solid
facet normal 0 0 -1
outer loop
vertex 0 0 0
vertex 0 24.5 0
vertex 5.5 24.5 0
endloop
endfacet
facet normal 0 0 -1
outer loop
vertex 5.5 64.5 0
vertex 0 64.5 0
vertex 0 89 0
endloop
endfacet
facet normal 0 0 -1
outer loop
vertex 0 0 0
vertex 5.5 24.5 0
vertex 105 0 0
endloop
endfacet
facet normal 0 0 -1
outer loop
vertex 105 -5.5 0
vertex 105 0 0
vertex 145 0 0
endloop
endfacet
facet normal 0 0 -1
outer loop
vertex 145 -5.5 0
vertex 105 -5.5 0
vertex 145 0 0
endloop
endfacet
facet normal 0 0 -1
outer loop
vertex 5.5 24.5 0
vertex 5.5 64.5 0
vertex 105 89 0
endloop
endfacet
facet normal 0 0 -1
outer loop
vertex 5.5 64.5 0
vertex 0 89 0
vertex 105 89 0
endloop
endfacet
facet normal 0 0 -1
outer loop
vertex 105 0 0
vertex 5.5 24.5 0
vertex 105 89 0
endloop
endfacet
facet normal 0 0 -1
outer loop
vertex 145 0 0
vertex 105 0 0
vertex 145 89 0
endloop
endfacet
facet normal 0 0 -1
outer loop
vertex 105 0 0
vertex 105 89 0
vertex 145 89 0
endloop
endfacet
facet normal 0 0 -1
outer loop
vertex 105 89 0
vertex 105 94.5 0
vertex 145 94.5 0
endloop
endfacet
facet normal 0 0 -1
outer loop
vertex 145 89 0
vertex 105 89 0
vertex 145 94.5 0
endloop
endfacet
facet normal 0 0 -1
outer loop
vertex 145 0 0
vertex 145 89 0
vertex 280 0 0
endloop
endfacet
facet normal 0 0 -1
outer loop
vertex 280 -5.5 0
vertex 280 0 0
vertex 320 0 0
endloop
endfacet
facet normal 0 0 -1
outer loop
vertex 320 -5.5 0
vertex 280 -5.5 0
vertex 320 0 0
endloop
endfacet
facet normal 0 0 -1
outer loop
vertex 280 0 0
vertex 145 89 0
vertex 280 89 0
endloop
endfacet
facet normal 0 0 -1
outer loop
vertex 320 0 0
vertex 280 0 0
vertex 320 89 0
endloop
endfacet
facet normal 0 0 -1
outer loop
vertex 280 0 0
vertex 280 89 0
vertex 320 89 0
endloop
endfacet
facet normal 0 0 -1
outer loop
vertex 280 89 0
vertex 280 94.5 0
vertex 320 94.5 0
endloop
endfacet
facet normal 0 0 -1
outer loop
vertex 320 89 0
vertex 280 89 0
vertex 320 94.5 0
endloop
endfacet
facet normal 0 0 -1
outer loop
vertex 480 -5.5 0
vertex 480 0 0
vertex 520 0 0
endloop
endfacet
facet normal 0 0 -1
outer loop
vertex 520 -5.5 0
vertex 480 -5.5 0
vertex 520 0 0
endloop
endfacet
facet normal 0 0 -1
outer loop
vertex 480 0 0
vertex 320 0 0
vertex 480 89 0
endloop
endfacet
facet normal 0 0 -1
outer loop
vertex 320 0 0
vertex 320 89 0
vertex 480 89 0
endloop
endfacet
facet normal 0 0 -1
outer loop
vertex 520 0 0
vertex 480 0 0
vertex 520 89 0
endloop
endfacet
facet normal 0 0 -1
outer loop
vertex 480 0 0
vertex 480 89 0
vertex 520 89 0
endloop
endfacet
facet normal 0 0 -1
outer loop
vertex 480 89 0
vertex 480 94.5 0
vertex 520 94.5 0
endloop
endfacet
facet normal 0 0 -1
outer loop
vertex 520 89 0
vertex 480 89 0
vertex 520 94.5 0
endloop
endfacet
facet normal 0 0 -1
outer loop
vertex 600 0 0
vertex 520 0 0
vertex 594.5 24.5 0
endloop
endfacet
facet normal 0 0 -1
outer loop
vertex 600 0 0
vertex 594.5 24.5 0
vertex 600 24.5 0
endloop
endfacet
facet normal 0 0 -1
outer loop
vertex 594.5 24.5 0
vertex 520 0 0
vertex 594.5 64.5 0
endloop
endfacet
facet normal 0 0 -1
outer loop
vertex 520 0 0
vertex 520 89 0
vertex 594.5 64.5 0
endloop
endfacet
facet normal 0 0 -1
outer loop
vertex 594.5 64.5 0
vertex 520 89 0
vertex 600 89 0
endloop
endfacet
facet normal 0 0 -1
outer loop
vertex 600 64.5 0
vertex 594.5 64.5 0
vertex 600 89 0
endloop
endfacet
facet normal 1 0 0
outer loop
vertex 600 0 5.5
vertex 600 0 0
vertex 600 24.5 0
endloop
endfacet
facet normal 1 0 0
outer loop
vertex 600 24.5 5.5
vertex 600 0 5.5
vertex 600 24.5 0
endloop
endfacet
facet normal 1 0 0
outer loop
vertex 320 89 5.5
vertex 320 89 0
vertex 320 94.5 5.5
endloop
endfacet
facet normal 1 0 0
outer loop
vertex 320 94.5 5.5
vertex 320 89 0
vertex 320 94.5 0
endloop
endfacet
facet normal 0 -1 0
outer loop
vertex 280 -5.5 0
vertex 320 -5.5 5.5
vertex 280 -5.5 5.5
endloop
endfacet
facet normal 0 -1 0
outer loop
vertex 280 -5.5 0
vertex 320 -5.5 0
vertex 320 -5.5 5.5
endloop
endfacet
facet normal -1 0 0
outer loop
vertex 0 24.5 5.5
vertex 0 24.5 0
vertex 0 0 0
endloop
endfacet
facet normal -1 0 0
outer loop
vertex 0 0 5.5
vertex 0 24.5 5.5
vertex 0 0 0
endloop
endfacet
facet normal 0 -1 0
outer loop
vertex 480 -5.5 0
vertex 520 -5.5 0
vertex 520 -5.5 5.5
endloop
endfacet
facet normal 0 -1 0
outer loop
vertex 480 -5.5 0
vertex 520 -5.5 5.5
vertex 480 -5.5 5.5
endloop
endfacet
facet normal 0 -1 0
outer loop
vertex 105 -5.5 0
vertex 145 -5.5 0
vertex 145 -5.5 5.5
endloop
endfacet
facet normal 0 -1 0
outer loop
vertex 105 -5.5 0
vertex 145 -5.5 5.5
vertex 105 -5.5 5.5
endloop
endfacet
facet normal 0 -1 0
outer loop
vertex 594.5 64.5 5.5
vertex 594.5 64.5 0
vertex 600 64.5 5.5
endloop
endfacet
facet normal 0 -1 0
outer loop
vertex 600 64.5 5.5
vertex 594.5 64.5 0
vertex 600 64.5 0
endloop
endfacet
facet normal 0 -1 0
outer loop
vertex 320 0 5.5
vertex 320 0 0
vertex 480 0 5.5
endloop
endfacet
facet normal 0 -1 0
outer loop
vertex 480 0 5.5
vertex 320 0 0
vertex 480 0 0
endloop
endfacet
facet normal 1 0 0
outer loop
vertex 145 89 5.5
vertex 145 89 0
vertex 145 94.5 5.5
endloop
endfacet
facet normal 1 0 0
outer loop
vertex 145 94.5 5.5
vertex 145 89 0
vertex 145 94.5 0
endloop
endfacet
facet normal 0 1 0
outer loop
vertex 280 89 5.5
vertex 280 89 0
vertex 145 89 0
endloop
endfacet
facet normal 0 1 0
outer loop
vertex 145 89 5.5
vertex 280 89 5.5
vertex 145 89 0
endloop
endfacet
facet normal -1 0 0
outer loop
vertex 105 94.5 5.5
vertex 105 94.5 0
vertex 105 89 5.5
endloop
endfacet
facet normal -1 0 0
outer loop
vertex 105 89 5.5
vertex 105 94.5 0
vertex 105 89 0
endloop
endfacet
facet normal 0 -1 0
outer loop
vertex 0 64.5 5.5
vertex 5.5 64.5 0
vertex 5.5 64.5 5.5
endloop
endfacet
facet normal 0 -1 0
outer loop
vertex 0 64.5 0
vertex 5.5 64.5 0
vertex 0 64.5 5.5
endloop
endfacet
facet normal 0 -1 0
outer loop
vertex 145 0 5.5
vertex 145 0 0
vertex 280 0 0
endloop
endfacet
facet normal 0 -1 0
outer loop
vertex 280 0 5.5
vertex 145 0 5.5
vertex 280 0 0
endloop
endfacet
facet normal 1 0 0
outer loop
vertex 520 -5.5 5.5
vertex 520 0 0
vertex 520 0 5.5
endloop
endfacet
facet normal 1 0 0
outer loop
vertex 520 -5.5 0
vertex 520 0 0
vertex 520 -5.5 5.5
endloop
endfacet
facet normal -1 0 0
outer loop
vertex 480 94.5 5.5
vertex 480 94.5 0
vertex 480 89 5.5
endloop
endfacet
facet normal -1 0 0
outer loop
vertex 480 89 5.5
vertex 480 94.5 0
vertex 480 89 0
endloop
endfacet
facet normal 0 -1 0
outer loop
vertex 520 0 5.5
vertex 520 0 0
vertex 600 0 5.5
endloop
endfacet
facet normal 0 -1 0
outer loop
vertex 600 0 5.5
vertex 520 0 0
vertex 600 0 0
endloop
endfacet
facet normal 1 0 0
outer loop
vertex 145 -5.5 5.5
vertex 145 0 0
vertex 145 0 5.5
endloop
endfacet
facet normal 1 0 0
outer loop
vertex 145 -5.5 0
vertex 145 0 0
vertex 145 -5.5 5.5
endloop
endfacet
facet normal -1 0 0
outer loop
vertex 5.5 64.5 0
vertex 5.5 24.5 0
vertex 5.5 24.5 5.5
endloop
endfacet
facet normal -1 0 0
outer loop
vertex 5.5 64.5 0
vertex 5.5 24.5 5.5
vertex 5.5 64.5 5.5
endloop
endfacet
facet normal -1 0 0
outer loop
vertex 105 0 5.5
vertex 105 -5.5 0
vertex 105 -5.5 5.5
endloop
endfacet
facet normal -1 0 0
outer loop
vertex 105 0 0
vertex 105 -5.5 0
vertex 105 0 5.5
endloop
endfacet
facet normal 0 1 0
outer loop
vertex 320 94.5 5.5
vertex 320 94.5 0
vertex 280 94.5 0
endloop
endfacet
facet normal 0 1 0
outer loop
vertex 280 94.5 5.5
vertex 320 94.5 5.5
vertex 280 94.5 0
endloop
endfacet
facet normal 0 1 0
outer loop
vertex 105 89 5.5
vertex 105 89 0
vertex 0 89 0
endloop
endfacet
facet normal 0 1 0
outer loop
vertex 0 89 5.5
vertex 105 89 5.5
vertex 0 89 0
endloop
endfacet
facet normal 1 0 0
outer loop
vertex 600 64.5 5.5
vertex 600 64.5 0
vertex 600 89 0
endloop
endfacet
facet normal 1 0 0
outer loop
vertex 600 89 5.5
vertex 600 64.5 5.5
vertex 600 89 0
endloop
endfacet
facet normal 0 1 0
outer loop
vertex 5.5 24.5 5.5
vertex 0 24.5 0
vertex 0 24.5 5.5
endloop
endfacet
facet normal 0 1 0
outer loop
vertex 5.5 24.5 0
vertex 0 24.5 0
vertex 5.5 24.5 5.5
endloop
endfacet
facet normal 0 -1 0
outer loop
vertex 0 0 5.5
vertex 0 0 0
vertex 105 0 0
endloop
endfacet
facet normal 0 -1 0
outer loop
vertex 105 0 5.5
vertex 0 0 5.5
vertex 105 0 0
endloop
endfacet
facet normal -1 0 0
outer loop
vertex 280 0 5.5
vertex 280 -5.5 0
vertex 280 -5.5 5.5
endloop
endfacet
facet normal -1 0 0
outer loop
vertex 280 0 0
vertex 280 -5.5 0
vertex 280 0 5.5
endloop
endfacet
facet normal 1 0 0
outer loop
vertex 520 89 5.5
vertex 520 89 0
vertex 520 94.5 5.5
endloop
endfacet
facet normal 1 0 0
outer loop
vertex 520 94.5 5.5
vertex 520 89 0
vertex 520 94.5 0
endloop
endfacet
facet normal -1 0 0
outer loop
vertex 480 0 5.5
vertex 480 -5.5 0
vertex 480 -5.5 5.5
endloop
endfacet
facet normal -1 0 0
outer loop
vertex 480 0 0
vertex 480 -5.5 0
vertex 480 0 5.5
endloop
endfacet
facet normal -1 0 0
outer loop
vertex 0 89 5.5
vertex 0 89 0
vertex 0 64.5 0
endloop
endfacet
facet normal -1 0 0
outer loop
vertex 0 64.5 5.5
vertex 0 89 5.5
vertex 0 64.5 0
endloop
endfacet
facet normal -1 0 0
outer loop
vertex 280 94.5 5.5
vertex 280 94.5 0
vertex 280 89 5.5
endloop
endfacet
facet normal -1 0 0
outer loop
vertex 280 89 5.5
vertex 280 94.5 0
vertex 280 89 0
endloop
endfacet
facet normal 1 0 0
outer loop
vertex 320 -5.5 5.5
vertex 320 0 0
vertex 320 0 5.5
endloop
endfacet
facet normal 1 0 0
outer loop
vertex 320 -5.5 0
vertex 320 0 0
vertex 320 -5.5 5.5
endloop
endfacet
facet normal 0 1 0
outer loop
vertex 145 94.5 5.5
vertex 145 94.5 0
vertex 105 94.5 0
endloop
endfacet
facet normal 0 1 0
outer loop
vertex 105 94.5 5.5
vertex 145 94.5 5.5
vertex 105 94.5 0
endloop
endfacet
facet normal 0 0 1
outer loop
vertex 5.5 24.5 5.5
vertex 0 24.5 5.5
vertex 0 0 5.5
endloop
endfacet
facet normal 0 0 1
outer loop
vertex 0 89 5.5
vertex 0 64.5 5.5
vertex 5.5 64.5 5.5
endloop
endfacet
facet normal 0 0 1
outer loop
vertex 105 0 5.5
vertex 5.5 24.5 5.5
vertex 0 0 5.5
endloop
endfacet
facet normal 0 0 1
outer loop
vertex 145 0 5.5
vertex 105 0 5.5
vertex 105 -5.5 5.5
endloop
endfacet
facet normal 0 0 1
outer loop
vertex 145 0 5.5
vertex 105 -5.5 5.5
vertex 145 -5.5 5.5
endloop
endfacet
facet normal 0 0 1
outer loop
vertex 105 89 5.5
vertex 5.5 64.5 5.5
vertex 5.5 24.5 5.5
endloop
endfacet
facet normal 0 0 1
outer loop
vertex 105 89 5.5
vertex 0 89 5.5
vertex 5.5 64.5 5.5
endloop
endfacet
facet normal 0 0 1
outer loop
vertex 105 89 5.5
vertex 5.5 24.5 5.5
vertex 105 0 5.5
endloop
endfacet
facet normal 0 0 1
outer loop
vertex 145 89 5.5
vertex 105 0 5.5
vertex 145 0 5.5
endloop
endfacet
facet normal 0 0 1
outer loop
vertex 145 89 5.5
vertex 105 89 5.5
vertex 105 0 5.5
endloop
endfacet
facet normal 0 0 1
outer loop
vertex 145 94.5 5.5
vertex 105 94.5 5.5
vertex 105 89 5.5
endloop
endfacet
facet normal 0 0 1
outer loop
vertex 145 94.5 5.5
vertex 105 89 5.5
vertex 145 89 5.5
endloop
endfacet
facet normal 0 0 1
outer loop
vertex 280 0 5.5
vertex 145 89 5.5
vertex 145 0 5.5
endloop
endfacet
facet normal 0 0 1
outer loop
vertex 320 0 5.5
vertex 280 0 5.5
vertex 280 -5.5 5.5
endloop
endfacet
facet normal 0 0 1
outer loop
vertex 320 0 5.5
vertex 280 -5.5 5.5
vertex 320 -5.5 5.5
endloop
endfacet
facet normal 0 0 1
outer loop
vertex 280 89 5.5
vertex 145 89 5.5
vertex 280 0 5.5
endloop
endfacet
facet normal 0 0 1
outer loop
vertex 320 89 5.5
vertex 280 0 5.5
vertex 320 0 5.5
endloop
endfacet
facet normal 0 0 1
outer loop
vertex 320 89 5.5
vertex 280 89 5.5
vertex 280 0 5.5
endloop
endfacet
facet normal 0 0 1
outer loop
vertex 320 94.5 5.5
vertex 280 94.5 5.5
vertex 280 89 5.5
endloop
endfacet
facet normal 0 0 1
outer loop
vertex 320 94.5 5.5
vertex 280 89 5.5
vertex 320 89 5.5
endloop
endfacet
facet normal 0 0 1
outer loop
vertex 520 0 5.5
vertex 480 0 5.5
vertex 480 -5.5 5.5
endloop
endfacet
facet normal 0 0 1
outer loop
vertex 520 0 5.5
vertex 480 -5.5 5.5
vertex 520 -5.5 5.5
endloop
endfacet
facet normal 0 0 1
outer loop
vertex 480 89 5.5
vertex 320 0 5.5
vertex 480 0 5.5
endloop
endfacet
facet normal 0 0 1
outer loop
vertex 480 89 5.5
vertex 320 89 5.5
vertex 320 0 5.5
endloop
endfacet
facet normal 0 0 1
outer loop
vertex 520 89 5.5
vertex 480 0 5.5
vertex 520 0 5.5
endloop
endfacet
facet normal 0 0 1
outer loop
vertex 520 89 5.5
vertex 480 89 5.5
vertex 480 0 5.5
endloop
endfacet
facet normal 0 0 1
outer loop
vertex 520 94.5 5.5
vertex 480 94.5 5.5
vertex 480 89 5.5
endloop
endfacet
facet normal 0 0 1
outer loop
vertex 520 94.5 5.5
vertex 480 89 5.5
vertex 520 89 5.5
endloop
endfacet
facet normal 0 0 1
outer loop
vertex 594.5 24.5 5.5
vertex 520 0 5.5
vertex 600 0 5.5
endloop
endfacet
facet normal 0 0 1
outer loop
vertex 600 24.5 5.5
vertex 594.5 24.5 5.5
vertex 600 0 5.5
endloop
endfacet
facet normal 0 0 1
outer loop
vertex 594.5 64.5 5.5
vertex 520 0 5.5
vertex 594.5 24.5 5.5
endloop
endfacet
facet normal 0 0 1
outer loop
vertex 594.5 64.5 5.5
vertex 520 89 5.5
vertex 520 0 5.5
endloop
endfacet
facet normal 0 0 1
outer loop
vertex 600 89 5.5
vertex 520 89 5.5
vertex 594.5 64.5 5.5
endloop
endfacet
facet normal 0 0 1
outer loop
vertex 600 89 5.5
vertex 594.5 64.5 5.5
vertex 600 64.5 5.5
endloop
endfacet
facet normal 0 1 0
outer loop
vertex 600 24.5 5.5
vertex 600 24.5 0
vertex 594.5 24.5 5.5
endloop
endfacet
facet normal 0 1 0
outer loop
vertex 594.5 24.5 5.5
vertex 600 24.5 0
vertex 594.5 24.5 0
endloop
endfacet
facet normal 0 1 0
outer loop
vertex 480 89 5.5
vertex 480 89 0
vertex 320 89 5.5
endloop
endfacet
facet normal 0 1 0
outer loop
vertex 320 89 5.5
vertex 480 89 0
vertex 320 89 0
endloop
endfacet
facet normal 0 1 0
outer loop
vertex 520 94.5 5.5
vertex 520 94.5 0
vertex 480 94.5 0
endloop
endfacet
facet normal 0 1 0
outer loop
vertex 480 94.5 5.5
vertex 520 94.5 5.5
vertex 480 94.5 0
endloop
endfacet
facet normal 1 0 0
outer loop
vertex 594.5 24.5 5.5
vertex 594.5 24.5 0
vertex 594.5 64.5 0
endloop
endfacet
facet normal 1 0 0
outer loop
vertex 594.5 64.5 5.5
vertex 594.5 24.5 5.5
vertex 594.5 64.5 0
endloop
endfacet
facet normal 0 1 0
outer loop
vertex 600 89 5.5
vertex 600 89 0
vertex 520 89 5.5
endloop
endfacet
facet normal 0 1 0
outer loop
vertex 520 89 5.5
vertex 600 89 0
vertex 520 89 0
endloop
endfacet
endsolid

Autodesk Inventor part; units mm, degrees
ref_plane "YZ Plane" through (0, 0, 0) normal (1, 0, 0) x (0, 1, 0)
ref_plane "XZ Plane" through (0, 0, 0) normal (0, 1, 0) x (-1, 0, 0)
ref_plane "XY Plane" through (0, 0, 0) normal (0, 0, 1) x (1, 0, 0)
sketch "Sketch1" plane through (0, 0, 0) normal (0, 0, 1) x (1, 0, 0)
  line L0 (0, 0) -> (600, 0)
  line L1 (600, 0) -> (600, 89)
  line L2 (600, 89) -> (0, 89)
  line L3 (0, 89) -> (0, 0)
  line L4 (105, 0) -> (145, 0)
  line L5 (145, 0) -> (145, -5.5)
  line L6 (145, -5.5) -> (105, -5.5)
  line L7 (105, -5.5) -> (105, 0)
  line L8 (280, 0) -> (320, 0)
  line L9 (320, 0) -> (320, -5.5)
  line L10 (320, -5.5) -> (280, -5.5)
  line L11 (280, -5.5) -> (280, 0)
  line L12 (480, 0) -> (520, 0)
  line L13 (520, 0) -> (520, -5.5)
  line L14 (520, -5.5) -> (480, -5.5)
  line L15 (480, -5.5) -> (480, 0)
  line L16 (105, 89) -> (145, 89)
  line L17 (145, 89) -> (145, 94.5)
  line L18 (145, 94.5) -> (105, 94.5)
  line L19 (105, 94.5) -> (105, 89)
  line L20 (280, 89) -> (320, 89)
  line L21 (320, 89) -> (320, 94.5)
  line L22 (320, 94.5) -> (280, 94.5)
  line L23 (280, 94.5) -> (280, 89)
  line L24 (480, 89) -> (520, 89)
  line L25 (520, 89) -> (520, 94.5)
  line L26 (520, 94.5) -> (480, 94.5)
  line L27 (480, 94.5) -> (480, 89)
  line L28 (0, 24.5) -> (5.5, 24.5)
  line L29 (5.5, 24.5) -> (5.5, 64.5)
  line L30 (5.5, 64.5) -> (0, 64.5)
  line L31 (0, 64.5) -> (0, 24.5)
  line L32 (600, 24.5) -> (594.5, 24.5)
  line L33 (594.5, 24.5) -> (594.5, 64.5)
  line L34 (594.5, 64.5) -> (600, 64.5)
  line L35 (600, 64.5) -> (600, 24.5)
  dimension "d0" = 600
  dimension "d1" = 89
  dimension "d2" = 40
  dimension "d3" = 5.5
  dimension "d4" = 40
  dimension "d5" = 5.5
  dimension "d6" = 40
  dimension "d7" = 5.5
  dimension "d8" = 5.5
  dimension "d9" = 40
  dimension "d10" = 5.5
  dimension "d11" = 40
extrude "Extrusion1" add sketch "Sketch1" along normal blind 5.5 contours L3 L28 L29 L30 L2 L1 L34 L33 L32 L0 | L0 L5 L6 L7 | L0 L9 L10 L11 | L19 L18 L17 L2 | L0 L13 L14 L15 | L23 L22 L21 L2 | L27 L26 L25 L2
properties part number "techo"
